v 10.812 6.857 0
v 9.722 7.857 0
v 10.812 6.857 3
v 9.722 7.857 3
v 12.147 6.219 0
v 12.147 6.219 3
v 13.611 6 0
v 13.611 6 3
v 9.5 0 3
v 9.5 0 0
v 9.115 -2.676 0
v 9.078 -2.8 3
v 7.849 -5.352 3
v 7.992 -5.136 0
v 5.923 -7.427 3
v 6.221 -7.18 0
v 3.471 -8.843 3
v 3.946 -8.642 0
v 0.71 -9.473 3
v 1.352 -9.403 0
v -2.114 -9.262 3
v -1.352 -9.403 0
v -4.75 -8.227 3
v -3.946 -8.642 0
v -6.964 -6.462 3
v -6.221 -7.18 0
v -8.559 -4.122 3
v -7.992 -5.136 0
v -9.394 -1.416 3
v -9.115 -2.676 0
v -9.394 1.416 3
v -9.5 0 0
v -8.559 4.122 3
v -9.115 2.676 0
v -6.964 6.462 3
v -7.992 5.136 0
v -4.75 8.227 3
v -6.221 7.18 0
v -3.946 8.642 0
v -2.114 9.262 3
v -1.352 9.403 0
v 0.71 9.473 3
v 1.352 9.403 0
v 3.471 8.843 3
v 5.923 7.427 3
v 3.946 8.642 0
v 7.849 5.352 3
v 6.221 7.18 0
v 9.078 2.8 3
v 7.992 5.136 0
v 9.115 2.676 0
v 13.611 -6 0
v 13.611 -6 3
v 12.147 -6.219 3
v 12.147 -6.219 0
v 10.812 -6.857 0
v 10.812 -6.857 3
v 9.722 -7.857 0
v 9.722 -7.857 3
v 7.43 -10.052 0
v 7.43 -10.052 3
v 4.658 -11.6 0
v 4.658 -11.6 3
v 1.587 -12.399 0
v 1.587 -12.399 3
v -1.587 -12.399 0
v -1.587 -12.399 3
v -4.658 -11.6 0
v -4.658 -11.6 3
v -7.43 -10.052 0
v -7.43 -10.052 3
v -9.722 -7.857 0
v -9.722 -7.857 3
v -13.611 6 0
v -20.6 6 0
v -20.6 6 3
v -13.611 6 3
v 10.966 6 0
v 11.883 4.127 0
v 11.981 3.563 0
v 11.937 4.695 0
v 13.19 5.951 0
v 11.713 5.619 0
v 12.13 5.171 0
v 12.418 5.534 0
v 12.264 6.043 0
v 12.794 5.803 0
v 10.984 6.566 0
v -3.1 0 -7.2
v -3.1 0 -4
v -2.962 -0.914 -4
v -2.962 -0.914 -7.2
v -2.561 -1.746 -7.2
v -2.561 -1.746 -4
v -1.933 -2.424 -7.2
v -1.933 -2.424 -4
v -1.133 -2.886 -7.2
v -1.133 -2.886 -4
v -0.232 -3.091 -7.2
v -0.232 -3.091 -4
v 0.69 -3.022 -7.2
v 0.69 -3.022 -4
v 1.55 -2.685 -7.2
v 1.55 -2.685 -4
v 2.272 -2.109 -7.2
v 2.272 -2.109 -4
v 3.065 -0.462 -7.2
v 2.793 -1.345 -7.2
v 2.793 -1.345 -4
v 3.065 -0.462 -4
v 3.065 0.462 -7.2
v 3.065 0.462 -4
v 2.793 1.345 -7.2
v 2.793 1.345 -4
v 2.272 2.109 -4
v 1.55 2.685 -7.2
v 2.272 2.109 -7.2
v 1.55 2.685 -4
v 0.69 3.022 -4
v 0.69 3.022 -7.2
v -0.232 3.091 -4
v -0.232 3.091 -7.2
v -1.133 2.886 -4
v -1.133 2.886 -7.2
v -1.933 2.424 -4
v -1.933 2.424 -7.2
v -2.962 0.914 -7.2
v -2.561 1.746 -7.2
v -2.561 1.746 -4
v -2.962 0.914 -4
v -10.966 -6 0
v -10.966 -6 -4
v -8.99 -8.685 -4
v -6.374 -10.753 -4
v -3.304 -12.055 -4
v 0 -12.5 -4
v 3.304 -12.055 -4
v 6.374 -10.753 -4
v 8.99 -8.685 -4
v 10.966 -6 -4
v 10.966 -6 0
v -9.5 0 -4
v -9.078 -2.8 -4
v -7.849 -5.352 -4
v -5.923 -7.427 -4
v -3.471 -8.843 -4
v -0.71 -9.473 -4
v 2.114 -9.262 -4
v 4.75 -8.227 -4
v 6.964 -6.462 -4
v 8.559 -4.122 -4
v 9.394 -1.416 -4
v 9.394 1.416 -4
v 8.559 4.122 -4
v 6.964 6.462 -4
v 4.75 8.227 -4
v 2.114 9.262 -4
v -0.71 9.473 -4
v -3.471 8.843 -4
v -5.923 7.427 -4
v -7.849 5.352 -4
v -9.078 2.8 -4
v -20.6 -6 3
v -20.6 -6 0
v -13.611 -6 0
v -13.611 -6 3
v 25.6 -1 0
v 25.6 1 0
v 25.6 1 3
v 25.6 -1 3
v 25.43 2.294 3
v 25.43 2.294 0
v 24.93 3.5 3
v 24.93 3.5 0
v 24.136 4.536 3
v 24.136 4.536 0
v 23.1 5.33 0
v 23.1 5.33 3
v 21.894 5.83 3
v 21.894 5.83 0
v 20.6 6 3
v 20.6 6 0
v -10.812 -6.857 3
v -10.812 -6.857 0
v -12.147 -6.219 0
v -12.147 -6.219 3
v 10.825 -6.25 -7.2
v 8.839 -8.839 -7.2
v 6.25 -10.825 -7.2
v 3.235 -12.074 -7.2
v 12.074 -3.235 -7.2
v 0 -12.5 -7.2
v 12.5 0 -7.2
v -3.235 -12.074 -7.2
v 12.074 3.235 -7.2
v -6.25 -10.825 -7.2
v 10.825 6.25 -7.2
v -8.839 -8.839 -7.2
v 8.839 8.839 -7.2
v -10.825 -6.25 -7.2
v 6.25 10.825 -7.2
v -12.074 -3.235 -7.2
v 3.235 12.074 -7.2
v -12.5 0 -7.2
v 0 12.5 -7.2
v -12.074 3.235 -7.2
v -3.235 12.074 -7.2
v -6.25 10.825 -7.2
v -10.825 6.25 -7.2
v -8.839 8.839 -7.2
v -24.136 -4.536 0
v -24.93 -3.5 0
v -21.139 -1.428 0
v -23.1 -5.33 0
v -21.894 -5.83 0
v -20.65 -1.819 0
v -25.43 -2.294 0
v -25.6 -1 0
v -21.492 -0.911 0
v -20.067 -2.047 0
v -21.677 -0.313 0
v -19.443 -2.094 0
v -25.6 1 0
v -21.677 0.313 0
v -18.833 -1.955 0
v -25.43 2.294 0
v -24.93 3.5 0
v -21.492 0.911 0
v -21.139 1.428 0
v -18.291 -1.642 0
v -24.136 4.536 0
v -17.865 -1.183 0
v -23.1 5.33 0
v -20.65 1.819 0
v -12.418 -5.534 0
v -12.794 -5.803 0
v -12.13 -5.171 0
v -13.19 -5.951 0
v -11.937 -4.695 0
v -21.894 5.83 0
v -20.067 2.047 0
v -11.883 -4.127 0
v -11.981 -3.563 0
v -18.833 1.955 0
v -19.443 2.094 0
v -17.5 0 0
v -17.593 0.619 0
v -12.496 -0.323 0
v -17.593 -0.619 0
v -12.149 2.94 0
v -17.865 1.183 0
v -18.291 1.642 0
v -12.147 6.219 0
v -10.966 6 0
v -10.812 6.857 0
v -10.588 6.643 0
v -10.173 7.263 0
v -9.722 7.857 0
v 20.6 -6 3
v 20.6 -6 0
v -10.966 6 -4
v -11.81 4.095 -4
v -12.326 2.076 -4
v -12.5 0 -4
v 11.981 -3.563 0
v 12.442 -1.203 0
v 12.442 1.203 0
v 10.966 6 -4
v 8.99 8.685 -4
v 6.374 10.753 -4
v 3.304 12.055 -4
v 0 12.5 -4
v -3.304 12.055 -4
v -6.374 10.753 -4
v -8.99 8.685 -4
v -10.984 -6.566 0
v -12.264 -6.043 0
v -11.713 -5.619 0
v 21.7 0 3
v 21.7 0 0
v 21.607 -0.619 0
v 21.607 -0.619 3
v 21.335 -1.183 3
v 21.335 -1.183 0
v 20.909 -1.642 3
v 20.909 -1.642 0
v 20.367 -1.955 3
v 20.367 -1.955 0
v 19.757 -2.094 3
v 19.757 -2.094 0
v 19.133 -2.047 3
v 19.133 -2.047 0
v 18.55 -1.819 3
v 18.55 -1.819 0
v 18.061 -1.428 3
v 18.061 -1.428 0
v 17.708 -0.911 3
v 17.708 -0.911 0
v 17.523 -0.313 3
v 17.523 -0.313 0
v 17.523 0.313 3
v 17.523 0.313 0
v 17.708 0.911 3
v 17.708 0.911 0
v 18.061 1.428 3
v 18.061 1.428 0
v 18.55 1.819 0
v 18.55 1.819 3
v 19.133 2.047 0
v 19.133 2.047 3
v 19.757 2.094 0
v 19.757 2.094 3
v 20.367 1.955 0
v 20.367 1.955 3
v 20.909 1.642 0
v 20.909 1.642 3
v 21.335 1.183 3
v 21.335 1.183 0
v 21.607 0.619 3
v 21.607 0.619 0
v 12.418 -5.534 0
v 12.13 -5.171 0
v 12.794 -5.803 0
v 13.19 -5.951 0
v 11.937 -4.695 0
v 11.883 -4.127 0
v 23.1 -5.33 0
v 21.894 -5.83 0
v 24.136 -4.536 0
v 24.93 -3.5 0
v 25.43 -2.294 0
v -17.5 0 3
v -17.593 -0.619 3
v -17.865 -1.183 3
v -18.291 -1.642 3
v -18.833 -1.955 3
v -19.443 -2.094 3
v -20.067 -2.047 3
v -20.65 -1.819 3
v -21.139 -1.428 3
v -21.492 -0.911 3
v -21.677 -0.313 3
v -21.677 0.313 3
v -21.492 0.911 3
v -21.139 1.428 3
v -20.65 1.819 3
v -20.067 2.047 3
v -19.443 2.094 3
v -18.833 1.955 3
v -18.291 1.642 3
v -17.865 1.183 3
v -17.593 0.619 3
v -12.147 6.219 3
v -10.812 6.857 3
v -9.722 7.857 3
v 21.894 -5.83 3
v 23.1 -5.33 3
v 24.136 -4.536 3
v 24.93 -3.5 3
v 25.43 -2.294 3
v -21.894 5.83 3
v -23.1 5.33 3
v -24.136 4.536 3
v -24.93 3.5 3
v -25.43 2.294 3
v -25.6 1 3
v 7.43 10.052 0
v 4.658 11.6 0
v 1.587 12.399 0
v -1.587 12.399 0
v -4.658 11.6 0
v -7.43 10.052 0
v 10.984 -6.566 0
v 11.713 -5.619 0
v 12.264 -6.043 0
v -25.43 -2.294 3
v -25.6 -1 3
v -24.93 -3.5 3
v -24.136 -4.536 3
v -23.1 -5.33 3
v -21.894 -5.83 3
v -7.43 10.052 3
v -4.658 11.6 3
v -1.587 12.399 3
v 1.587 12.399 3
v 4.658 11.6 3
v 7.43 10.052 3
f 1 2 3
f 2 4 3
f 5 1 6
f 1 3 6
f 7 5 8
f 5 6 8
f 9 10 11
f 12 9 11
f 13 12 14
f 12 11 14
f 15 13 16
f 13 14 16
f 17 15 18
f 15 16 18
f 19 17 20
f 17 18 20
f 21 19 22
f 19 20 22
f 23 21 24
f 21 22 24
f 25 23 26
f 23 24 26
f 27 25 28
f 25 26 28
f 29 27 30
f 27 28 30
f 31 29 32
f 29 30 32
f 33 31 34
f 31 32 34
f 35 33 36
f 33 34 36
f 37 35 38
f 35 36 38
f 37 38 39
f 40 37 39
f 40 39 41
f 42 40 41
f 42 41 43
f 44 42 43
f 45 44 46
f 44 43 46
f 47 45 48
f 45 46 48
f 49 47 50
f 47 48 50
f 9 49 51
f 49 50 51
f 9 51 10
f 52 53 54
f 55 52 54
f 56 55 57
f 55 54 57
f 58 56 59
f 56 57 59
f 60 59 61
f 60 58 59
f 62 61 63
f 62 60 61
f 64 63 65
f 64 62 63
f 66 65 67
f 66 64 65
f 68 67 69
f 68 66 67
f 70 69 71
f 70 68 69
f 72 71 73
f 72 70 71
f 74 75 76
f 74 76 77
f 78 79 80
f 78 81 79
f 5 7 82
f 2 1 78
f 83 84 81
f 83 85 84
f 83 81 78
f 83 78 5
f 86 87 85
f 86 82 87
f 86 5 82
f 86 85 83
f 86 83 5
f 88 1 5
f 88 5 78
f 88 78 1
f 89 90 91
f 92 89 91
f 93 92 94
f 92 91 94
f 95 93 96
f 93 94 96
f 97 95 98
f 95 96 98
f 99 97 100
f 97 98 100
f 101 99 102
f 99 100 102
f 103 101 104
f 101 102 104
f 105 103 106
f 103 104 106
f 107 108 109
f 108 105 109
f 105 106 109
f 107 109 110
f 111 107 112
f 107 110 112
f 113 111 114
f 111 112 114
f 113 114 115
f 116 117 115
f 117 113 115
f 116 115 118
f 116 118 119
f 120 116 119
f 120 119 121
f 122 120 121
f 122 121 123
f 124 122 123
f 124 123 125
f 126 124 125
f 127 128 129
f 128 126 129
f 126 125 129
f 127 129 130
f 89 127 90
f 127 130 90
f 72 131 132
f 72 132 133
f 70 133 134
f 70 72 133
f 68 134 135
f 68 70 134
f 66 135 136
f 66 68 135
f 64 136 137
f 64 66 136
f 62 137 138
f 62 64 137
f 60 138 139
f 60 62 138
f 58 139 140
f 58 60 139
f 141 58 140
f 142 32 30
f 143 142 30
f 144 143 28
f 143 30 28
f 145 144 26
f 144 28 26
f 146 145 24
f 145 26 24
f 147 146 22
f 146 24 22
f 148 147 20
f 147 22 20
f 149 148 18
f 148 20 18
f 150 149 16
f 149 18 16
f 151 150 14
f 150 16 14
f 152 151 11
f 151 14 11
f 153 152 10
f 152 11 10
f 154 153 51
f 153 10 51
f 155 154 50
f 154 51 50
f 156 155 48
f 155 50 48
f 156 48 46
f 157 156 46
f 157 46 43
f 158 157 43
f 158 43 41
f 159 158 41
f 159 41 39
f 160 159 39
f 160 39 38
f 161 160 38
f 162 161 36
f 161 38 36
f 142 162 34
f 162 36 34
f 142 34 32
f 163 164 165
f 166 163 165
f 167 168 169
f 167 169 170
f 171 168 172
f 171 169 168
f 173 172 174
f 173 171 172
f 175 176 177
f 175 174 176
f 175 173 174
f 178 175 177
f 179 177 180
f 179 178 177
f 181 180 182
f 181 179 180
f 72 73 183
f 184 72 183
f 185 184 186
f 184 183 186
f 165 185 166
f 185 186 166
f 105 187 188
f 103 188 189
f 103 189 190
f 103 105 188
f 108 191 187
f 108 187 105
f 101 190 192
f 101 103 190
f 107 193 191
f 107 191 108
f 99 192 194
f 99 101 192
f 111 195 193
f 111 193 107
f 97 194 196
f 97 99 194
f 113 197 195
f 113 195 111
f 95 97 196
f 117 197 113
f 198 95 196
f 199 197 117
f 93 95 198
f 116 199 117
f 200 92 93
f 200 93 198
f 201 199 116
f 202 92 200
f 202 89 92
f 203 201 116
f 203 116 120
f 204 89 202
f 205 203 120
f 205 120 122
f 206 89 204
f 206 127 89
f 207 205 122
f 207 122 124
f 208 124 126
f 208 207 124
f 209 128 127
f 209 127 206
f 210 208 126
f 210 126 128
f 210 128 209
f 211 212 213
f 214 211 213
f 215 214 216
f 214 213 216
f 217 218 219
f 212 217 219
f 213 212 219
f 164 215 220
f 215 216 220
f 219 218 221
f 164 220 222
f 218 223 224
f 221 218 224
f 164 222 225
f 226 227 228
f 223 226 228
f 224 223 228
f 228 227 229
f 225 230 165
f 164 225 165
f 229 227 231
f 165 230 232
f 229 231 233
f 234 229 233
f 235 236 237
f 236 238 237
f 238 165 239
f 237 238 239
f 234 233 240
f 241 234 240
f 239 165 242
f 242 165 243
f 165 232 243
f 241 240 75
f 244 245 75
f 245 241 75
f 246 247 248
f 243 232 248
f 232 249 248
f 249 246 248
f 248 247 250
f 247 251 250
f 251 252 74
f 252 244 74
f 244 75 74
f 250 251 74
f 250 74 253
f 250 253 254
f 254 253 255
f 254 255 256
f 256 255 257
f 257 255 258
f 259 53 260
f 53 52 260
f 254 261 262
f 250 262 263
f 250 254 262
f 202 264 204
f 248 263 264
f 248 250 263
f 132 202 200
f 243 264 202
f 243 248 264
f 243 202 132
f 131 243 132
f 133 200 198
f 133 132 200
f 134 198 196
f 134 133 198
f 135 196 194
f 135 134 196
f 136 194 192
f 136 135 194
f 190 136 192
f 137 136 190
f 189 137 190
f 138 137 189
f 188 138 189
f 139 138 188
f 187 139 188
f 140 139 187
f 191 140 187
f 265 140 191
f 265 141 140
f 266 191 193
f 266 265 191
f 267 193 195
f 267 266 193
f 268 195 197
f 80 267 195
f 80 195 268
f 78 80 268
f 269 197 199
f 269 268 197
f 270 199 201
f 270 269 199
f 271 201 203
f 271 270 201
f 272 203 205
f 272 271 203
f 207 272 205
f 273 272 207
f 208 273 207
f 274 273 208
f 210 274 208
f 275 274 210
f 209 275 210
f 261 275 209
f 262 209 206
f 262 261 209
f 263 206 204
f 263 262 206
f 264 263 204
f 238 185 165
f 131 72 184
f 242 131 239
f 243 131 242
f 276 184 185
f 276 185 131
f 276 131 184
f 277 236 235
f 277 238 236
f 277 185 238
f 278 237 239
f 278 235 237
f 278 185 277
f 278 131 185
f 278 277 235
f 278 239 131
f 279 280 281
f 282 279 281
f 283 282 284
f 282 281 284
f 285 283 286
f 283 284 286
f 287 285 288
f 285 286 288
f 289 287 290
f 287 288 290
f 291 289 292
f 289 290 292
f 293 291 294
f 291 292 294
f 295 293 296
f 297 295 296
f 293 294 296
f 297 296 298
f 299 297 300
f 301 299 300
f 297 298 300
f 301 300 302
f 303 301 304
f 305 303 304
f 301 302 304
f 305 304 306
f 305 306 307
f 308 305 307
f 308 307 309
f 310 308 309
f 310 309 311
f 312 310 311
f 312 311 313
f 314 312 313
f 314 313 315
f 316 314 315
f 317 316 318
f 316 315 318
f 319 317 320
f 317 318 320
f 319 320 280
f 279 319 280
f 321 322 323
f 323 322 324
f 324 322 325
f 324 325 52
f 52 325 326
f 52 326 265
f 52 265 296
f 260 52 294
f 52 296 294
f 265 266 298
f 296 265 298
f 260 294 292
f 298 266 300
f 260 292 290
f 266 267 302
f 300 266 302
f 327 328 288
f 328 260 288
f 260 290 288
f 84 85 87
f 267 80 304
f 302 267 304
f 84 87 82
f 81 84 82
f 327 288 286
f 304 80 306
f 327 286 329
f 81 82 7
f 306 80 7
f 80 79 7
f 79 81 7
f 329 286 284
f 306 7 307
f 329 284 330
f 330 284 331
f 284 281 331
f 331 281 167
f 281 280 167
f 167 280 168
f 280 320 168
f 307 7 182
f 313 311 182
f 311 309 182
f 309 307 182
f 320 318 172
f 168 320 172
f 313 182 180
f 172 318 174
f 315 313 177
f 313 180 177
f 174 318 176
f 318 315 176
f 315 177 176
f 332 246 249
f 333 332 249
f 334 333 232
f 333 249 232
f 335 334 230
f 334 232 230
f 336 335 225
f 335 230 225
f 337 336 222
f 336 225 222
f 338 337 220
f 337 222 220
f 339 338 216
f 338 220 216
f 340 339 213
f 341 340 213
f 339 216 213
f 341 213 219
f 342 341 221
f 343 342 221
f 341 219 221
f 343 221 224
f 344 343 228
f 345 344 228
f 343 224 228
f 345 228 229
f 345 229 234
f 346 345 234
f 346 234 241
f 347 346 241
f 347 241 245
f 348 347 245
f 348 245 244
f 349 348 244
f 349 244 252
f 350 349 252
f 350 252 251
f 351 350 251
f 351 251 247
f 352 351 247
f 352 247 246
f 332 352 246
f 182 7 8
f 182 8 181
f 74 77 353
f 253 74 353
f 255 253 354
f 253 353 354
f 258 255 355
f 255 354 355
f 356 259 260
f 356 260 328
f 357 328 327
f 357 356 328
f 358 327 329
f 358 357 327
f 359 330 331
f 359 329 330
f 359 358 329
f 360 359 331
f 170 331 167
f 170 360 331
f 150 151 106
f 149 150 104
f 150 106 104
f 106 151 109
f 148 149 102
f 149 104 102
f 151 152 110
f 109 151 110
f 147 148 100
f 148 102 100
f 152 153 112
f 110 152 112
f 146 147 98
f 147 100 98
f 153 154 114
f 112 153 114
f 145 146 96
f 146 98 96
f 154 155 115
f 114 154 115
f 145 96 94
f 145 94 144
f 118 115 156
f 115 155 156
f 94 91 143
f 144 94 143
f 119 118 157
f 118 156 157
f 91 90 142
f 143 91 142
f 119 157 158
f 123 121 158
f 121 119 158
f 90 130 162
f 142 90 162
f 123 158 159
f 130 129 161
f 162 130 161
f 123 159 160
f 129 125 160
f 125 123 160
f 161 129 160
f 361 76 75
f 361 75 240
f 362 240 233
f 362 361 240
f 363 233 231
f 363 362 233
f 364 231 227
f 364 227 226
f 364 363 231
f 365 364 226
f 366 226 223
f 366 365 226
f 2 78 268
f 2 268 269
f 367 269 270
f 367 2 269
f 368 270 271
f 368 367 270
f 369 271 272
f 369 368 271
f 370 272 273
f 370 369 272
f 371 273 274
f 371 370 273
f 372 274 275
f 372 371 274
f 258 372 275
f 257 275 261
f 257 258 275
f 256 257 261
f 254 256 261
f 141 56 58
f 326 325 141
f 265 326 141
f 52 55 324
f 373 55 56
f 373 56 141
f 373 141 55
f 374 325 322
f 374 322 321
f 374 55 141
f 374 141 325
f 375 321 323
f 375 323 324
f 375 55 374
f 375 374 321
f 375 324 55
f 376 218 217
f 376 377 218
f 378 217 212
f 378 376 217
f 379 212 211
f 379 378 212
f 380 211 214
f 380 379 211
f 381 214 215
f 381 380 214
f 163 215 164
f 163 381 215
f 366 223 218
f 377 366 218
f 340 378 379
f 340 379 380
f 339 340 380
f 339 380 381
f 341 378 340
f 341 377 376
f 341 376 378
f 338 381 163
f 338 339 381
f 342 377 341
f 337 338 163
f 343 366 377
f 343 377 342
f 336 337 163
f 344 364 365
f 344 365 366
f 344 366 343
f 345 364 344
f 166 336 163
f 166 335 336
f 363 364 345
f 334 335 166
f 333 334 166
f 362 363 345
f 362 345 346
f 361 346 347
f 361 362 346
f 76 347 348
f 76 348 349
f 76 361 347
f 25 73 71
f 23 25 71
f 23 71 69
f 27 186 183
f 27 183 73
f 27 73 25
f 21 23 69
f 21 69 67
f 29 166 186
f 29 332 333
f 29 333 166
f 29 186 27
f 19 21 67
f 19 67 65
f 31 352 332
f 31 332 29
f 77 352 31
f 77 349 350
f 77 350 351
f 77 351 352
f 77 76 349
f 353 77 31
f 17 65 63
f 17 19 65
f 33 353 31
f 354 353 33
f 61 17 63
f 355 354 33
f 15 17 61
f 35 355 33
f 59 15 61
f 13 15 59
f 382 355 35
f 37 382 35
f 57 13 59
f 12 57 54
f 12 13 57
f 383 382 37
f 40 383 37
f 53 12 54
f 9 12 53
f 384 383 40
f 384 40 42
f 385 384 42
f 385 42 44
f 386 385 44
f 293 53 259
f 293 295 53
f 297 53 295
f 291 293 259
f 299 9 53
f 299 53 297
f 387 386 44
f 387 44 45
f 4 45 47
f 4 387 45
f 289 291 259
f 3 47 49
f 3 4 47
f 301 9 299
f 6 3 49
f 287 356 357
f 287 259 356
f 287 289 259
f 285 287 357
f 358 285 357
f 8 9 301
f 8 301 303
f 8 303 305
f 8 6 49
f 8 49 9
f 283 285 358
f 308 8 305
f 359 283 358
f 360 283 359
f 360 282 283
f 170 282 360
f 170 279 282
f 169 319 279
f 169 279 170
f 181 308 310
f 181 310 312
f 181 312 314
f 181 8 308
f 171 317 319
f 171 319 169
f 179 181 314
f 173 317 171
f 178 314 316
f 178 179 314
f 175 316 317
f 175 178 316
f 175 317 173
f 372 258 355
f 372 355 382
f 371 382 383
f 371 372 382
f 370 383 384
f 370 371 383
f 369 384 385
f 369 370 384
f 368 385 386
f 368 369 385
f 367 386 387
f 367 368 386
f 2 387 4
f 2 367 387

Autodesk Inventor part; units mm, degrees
ref_plane "YZ Plane" through (0, 0, 0) normal (1, 0, 0) x (0, 1, 0)
ref_plane "XZ Plane" through (0, 0, 0) normal (0, 1, 0) x (-1, 0, 0)
ref_plane "XY Plane" through (0, 0, 0) normal (0, 0, 1) x (1, 0, 0)
sketch "Эскиз1" plane through (0, 0, 0) normal (0, 0, 1) x (1, 0, 0)
  circle A0 centre (0, 0) radius 9.5
  circle A1 centre (0, 0) radius 12.5
  circle A2 centre (0, 0) radius 19.6
  circle A3 centre (-19.6, 0) radius 2.1
  circle A4 centre (19.6, 0) radius 2.1
  line L0 (-21.7, 0) -> (21.7, 0)
  line L1 (-25.6, 6) -> (25.6, 6)
  line L2 (-25.6, -6) -> (25.6, -6)
  line L3 (-25.6, 6) -> (-25.6, -6)
  line L4 (0, 0) -> (0, 6)
  line L5 (25.6, 6) -> (25.6, -6)
  point P0 (10.9659, -6)
  point P1 (10.9659, 6)
  point P2 (-10.9659, 6)
  point P3 (-10.9659, -6)
  dimension "d3" = 4.2
  dimension "d4" = 4.2
  dimension "d0" = 19
  dimension "d1" = 25
  dimension "d2" = 39.2
  dimension "d5" = 6
  dimension "d6" = 6
  dimension "d7" = 6
extrude "Выдавливание1" add sketch "Эскиз1" along normal blind 3 contours L0 A1 L2 A0 | A0 L1 A1 L0 | A0 L1 A1 | L2 A1 A0 | L0 A4 A2 L2 A1 | A1 L1 A2 A4 L0 | A0 L0 A1 L1 | L2 A1 L0 A0 | A1 L0 A3 A2 L1 | L1 L5 L2 A2 A4 | L2 A2 A3 L0 A1 | A2 A3 L2 L3 L1
sketch "Эскиз2" plane through (0, 0, 0) normal (0, 0, -1) x (-1, 0, 0)
  line L0 (-25.6, -6) -> (-25.6, 6) projected
  line L1 (-10.9659, -6) -> (-25.6, -6) projected
  arc A0 (-10.9659, -6) -> (10.9659, -6) centre (0, 0) ccw projected
  line L2 (25.6, -6) -> (10.9659, -6) projected
  line L3 (25.6, 6) -> (25.6, -6) projected
  line L4 (10.9659, 6) -> (25.6, 6) projected
  arc A1 (10.9659, 6) -> (-10.9659, 6) centre (0, 0) ccw projected
  line L5 (-25.6, 6) -> (-10.9659, 6) projected
  circle A2 centre (-19.6, 0) radius 2.1 projected
  circle A3 centre (19.6, 0) radius 2.1 projected
  circle A4 centre (0, 0) radius 9.5 projected
  circle A5 centre (0, 0) radius 12.5
  point P0 (-10.9659, 6)
extrude "Выдавливание2" add sketch "Эскиз2" along normal blind 4 contours A5 A1 A0
sketch "Эскиз3" plane through (0, 0, -4) normal (0, 0, -1) x (-1, 0, 0)
  circle A0 centre (0, 0) radius 12.5 projected
  circle A1 centre (0, 0) radius 9.5 projected
  circle A2 centre (0, 0) radius 3.1
  dimension "d12" = 6.2
extrude "Выдавливание3" add sketch "Эскиз3" along normal blind 3.2 contours A0 | A1
fillet "Сопряжение1" radius 5 8 edges at (-25.6, 6, 1.5) (-25.6, -6, 1.5) (25.6, 6, 1.5) (25.6, -6, 1.5) (10.9659, -6, 1.5) (10.9659, 6, 1.5) (-10.9659, 6, 1.5) (-10.9659, -6, 1.5)
properties part number "для подшипника 25-26"
